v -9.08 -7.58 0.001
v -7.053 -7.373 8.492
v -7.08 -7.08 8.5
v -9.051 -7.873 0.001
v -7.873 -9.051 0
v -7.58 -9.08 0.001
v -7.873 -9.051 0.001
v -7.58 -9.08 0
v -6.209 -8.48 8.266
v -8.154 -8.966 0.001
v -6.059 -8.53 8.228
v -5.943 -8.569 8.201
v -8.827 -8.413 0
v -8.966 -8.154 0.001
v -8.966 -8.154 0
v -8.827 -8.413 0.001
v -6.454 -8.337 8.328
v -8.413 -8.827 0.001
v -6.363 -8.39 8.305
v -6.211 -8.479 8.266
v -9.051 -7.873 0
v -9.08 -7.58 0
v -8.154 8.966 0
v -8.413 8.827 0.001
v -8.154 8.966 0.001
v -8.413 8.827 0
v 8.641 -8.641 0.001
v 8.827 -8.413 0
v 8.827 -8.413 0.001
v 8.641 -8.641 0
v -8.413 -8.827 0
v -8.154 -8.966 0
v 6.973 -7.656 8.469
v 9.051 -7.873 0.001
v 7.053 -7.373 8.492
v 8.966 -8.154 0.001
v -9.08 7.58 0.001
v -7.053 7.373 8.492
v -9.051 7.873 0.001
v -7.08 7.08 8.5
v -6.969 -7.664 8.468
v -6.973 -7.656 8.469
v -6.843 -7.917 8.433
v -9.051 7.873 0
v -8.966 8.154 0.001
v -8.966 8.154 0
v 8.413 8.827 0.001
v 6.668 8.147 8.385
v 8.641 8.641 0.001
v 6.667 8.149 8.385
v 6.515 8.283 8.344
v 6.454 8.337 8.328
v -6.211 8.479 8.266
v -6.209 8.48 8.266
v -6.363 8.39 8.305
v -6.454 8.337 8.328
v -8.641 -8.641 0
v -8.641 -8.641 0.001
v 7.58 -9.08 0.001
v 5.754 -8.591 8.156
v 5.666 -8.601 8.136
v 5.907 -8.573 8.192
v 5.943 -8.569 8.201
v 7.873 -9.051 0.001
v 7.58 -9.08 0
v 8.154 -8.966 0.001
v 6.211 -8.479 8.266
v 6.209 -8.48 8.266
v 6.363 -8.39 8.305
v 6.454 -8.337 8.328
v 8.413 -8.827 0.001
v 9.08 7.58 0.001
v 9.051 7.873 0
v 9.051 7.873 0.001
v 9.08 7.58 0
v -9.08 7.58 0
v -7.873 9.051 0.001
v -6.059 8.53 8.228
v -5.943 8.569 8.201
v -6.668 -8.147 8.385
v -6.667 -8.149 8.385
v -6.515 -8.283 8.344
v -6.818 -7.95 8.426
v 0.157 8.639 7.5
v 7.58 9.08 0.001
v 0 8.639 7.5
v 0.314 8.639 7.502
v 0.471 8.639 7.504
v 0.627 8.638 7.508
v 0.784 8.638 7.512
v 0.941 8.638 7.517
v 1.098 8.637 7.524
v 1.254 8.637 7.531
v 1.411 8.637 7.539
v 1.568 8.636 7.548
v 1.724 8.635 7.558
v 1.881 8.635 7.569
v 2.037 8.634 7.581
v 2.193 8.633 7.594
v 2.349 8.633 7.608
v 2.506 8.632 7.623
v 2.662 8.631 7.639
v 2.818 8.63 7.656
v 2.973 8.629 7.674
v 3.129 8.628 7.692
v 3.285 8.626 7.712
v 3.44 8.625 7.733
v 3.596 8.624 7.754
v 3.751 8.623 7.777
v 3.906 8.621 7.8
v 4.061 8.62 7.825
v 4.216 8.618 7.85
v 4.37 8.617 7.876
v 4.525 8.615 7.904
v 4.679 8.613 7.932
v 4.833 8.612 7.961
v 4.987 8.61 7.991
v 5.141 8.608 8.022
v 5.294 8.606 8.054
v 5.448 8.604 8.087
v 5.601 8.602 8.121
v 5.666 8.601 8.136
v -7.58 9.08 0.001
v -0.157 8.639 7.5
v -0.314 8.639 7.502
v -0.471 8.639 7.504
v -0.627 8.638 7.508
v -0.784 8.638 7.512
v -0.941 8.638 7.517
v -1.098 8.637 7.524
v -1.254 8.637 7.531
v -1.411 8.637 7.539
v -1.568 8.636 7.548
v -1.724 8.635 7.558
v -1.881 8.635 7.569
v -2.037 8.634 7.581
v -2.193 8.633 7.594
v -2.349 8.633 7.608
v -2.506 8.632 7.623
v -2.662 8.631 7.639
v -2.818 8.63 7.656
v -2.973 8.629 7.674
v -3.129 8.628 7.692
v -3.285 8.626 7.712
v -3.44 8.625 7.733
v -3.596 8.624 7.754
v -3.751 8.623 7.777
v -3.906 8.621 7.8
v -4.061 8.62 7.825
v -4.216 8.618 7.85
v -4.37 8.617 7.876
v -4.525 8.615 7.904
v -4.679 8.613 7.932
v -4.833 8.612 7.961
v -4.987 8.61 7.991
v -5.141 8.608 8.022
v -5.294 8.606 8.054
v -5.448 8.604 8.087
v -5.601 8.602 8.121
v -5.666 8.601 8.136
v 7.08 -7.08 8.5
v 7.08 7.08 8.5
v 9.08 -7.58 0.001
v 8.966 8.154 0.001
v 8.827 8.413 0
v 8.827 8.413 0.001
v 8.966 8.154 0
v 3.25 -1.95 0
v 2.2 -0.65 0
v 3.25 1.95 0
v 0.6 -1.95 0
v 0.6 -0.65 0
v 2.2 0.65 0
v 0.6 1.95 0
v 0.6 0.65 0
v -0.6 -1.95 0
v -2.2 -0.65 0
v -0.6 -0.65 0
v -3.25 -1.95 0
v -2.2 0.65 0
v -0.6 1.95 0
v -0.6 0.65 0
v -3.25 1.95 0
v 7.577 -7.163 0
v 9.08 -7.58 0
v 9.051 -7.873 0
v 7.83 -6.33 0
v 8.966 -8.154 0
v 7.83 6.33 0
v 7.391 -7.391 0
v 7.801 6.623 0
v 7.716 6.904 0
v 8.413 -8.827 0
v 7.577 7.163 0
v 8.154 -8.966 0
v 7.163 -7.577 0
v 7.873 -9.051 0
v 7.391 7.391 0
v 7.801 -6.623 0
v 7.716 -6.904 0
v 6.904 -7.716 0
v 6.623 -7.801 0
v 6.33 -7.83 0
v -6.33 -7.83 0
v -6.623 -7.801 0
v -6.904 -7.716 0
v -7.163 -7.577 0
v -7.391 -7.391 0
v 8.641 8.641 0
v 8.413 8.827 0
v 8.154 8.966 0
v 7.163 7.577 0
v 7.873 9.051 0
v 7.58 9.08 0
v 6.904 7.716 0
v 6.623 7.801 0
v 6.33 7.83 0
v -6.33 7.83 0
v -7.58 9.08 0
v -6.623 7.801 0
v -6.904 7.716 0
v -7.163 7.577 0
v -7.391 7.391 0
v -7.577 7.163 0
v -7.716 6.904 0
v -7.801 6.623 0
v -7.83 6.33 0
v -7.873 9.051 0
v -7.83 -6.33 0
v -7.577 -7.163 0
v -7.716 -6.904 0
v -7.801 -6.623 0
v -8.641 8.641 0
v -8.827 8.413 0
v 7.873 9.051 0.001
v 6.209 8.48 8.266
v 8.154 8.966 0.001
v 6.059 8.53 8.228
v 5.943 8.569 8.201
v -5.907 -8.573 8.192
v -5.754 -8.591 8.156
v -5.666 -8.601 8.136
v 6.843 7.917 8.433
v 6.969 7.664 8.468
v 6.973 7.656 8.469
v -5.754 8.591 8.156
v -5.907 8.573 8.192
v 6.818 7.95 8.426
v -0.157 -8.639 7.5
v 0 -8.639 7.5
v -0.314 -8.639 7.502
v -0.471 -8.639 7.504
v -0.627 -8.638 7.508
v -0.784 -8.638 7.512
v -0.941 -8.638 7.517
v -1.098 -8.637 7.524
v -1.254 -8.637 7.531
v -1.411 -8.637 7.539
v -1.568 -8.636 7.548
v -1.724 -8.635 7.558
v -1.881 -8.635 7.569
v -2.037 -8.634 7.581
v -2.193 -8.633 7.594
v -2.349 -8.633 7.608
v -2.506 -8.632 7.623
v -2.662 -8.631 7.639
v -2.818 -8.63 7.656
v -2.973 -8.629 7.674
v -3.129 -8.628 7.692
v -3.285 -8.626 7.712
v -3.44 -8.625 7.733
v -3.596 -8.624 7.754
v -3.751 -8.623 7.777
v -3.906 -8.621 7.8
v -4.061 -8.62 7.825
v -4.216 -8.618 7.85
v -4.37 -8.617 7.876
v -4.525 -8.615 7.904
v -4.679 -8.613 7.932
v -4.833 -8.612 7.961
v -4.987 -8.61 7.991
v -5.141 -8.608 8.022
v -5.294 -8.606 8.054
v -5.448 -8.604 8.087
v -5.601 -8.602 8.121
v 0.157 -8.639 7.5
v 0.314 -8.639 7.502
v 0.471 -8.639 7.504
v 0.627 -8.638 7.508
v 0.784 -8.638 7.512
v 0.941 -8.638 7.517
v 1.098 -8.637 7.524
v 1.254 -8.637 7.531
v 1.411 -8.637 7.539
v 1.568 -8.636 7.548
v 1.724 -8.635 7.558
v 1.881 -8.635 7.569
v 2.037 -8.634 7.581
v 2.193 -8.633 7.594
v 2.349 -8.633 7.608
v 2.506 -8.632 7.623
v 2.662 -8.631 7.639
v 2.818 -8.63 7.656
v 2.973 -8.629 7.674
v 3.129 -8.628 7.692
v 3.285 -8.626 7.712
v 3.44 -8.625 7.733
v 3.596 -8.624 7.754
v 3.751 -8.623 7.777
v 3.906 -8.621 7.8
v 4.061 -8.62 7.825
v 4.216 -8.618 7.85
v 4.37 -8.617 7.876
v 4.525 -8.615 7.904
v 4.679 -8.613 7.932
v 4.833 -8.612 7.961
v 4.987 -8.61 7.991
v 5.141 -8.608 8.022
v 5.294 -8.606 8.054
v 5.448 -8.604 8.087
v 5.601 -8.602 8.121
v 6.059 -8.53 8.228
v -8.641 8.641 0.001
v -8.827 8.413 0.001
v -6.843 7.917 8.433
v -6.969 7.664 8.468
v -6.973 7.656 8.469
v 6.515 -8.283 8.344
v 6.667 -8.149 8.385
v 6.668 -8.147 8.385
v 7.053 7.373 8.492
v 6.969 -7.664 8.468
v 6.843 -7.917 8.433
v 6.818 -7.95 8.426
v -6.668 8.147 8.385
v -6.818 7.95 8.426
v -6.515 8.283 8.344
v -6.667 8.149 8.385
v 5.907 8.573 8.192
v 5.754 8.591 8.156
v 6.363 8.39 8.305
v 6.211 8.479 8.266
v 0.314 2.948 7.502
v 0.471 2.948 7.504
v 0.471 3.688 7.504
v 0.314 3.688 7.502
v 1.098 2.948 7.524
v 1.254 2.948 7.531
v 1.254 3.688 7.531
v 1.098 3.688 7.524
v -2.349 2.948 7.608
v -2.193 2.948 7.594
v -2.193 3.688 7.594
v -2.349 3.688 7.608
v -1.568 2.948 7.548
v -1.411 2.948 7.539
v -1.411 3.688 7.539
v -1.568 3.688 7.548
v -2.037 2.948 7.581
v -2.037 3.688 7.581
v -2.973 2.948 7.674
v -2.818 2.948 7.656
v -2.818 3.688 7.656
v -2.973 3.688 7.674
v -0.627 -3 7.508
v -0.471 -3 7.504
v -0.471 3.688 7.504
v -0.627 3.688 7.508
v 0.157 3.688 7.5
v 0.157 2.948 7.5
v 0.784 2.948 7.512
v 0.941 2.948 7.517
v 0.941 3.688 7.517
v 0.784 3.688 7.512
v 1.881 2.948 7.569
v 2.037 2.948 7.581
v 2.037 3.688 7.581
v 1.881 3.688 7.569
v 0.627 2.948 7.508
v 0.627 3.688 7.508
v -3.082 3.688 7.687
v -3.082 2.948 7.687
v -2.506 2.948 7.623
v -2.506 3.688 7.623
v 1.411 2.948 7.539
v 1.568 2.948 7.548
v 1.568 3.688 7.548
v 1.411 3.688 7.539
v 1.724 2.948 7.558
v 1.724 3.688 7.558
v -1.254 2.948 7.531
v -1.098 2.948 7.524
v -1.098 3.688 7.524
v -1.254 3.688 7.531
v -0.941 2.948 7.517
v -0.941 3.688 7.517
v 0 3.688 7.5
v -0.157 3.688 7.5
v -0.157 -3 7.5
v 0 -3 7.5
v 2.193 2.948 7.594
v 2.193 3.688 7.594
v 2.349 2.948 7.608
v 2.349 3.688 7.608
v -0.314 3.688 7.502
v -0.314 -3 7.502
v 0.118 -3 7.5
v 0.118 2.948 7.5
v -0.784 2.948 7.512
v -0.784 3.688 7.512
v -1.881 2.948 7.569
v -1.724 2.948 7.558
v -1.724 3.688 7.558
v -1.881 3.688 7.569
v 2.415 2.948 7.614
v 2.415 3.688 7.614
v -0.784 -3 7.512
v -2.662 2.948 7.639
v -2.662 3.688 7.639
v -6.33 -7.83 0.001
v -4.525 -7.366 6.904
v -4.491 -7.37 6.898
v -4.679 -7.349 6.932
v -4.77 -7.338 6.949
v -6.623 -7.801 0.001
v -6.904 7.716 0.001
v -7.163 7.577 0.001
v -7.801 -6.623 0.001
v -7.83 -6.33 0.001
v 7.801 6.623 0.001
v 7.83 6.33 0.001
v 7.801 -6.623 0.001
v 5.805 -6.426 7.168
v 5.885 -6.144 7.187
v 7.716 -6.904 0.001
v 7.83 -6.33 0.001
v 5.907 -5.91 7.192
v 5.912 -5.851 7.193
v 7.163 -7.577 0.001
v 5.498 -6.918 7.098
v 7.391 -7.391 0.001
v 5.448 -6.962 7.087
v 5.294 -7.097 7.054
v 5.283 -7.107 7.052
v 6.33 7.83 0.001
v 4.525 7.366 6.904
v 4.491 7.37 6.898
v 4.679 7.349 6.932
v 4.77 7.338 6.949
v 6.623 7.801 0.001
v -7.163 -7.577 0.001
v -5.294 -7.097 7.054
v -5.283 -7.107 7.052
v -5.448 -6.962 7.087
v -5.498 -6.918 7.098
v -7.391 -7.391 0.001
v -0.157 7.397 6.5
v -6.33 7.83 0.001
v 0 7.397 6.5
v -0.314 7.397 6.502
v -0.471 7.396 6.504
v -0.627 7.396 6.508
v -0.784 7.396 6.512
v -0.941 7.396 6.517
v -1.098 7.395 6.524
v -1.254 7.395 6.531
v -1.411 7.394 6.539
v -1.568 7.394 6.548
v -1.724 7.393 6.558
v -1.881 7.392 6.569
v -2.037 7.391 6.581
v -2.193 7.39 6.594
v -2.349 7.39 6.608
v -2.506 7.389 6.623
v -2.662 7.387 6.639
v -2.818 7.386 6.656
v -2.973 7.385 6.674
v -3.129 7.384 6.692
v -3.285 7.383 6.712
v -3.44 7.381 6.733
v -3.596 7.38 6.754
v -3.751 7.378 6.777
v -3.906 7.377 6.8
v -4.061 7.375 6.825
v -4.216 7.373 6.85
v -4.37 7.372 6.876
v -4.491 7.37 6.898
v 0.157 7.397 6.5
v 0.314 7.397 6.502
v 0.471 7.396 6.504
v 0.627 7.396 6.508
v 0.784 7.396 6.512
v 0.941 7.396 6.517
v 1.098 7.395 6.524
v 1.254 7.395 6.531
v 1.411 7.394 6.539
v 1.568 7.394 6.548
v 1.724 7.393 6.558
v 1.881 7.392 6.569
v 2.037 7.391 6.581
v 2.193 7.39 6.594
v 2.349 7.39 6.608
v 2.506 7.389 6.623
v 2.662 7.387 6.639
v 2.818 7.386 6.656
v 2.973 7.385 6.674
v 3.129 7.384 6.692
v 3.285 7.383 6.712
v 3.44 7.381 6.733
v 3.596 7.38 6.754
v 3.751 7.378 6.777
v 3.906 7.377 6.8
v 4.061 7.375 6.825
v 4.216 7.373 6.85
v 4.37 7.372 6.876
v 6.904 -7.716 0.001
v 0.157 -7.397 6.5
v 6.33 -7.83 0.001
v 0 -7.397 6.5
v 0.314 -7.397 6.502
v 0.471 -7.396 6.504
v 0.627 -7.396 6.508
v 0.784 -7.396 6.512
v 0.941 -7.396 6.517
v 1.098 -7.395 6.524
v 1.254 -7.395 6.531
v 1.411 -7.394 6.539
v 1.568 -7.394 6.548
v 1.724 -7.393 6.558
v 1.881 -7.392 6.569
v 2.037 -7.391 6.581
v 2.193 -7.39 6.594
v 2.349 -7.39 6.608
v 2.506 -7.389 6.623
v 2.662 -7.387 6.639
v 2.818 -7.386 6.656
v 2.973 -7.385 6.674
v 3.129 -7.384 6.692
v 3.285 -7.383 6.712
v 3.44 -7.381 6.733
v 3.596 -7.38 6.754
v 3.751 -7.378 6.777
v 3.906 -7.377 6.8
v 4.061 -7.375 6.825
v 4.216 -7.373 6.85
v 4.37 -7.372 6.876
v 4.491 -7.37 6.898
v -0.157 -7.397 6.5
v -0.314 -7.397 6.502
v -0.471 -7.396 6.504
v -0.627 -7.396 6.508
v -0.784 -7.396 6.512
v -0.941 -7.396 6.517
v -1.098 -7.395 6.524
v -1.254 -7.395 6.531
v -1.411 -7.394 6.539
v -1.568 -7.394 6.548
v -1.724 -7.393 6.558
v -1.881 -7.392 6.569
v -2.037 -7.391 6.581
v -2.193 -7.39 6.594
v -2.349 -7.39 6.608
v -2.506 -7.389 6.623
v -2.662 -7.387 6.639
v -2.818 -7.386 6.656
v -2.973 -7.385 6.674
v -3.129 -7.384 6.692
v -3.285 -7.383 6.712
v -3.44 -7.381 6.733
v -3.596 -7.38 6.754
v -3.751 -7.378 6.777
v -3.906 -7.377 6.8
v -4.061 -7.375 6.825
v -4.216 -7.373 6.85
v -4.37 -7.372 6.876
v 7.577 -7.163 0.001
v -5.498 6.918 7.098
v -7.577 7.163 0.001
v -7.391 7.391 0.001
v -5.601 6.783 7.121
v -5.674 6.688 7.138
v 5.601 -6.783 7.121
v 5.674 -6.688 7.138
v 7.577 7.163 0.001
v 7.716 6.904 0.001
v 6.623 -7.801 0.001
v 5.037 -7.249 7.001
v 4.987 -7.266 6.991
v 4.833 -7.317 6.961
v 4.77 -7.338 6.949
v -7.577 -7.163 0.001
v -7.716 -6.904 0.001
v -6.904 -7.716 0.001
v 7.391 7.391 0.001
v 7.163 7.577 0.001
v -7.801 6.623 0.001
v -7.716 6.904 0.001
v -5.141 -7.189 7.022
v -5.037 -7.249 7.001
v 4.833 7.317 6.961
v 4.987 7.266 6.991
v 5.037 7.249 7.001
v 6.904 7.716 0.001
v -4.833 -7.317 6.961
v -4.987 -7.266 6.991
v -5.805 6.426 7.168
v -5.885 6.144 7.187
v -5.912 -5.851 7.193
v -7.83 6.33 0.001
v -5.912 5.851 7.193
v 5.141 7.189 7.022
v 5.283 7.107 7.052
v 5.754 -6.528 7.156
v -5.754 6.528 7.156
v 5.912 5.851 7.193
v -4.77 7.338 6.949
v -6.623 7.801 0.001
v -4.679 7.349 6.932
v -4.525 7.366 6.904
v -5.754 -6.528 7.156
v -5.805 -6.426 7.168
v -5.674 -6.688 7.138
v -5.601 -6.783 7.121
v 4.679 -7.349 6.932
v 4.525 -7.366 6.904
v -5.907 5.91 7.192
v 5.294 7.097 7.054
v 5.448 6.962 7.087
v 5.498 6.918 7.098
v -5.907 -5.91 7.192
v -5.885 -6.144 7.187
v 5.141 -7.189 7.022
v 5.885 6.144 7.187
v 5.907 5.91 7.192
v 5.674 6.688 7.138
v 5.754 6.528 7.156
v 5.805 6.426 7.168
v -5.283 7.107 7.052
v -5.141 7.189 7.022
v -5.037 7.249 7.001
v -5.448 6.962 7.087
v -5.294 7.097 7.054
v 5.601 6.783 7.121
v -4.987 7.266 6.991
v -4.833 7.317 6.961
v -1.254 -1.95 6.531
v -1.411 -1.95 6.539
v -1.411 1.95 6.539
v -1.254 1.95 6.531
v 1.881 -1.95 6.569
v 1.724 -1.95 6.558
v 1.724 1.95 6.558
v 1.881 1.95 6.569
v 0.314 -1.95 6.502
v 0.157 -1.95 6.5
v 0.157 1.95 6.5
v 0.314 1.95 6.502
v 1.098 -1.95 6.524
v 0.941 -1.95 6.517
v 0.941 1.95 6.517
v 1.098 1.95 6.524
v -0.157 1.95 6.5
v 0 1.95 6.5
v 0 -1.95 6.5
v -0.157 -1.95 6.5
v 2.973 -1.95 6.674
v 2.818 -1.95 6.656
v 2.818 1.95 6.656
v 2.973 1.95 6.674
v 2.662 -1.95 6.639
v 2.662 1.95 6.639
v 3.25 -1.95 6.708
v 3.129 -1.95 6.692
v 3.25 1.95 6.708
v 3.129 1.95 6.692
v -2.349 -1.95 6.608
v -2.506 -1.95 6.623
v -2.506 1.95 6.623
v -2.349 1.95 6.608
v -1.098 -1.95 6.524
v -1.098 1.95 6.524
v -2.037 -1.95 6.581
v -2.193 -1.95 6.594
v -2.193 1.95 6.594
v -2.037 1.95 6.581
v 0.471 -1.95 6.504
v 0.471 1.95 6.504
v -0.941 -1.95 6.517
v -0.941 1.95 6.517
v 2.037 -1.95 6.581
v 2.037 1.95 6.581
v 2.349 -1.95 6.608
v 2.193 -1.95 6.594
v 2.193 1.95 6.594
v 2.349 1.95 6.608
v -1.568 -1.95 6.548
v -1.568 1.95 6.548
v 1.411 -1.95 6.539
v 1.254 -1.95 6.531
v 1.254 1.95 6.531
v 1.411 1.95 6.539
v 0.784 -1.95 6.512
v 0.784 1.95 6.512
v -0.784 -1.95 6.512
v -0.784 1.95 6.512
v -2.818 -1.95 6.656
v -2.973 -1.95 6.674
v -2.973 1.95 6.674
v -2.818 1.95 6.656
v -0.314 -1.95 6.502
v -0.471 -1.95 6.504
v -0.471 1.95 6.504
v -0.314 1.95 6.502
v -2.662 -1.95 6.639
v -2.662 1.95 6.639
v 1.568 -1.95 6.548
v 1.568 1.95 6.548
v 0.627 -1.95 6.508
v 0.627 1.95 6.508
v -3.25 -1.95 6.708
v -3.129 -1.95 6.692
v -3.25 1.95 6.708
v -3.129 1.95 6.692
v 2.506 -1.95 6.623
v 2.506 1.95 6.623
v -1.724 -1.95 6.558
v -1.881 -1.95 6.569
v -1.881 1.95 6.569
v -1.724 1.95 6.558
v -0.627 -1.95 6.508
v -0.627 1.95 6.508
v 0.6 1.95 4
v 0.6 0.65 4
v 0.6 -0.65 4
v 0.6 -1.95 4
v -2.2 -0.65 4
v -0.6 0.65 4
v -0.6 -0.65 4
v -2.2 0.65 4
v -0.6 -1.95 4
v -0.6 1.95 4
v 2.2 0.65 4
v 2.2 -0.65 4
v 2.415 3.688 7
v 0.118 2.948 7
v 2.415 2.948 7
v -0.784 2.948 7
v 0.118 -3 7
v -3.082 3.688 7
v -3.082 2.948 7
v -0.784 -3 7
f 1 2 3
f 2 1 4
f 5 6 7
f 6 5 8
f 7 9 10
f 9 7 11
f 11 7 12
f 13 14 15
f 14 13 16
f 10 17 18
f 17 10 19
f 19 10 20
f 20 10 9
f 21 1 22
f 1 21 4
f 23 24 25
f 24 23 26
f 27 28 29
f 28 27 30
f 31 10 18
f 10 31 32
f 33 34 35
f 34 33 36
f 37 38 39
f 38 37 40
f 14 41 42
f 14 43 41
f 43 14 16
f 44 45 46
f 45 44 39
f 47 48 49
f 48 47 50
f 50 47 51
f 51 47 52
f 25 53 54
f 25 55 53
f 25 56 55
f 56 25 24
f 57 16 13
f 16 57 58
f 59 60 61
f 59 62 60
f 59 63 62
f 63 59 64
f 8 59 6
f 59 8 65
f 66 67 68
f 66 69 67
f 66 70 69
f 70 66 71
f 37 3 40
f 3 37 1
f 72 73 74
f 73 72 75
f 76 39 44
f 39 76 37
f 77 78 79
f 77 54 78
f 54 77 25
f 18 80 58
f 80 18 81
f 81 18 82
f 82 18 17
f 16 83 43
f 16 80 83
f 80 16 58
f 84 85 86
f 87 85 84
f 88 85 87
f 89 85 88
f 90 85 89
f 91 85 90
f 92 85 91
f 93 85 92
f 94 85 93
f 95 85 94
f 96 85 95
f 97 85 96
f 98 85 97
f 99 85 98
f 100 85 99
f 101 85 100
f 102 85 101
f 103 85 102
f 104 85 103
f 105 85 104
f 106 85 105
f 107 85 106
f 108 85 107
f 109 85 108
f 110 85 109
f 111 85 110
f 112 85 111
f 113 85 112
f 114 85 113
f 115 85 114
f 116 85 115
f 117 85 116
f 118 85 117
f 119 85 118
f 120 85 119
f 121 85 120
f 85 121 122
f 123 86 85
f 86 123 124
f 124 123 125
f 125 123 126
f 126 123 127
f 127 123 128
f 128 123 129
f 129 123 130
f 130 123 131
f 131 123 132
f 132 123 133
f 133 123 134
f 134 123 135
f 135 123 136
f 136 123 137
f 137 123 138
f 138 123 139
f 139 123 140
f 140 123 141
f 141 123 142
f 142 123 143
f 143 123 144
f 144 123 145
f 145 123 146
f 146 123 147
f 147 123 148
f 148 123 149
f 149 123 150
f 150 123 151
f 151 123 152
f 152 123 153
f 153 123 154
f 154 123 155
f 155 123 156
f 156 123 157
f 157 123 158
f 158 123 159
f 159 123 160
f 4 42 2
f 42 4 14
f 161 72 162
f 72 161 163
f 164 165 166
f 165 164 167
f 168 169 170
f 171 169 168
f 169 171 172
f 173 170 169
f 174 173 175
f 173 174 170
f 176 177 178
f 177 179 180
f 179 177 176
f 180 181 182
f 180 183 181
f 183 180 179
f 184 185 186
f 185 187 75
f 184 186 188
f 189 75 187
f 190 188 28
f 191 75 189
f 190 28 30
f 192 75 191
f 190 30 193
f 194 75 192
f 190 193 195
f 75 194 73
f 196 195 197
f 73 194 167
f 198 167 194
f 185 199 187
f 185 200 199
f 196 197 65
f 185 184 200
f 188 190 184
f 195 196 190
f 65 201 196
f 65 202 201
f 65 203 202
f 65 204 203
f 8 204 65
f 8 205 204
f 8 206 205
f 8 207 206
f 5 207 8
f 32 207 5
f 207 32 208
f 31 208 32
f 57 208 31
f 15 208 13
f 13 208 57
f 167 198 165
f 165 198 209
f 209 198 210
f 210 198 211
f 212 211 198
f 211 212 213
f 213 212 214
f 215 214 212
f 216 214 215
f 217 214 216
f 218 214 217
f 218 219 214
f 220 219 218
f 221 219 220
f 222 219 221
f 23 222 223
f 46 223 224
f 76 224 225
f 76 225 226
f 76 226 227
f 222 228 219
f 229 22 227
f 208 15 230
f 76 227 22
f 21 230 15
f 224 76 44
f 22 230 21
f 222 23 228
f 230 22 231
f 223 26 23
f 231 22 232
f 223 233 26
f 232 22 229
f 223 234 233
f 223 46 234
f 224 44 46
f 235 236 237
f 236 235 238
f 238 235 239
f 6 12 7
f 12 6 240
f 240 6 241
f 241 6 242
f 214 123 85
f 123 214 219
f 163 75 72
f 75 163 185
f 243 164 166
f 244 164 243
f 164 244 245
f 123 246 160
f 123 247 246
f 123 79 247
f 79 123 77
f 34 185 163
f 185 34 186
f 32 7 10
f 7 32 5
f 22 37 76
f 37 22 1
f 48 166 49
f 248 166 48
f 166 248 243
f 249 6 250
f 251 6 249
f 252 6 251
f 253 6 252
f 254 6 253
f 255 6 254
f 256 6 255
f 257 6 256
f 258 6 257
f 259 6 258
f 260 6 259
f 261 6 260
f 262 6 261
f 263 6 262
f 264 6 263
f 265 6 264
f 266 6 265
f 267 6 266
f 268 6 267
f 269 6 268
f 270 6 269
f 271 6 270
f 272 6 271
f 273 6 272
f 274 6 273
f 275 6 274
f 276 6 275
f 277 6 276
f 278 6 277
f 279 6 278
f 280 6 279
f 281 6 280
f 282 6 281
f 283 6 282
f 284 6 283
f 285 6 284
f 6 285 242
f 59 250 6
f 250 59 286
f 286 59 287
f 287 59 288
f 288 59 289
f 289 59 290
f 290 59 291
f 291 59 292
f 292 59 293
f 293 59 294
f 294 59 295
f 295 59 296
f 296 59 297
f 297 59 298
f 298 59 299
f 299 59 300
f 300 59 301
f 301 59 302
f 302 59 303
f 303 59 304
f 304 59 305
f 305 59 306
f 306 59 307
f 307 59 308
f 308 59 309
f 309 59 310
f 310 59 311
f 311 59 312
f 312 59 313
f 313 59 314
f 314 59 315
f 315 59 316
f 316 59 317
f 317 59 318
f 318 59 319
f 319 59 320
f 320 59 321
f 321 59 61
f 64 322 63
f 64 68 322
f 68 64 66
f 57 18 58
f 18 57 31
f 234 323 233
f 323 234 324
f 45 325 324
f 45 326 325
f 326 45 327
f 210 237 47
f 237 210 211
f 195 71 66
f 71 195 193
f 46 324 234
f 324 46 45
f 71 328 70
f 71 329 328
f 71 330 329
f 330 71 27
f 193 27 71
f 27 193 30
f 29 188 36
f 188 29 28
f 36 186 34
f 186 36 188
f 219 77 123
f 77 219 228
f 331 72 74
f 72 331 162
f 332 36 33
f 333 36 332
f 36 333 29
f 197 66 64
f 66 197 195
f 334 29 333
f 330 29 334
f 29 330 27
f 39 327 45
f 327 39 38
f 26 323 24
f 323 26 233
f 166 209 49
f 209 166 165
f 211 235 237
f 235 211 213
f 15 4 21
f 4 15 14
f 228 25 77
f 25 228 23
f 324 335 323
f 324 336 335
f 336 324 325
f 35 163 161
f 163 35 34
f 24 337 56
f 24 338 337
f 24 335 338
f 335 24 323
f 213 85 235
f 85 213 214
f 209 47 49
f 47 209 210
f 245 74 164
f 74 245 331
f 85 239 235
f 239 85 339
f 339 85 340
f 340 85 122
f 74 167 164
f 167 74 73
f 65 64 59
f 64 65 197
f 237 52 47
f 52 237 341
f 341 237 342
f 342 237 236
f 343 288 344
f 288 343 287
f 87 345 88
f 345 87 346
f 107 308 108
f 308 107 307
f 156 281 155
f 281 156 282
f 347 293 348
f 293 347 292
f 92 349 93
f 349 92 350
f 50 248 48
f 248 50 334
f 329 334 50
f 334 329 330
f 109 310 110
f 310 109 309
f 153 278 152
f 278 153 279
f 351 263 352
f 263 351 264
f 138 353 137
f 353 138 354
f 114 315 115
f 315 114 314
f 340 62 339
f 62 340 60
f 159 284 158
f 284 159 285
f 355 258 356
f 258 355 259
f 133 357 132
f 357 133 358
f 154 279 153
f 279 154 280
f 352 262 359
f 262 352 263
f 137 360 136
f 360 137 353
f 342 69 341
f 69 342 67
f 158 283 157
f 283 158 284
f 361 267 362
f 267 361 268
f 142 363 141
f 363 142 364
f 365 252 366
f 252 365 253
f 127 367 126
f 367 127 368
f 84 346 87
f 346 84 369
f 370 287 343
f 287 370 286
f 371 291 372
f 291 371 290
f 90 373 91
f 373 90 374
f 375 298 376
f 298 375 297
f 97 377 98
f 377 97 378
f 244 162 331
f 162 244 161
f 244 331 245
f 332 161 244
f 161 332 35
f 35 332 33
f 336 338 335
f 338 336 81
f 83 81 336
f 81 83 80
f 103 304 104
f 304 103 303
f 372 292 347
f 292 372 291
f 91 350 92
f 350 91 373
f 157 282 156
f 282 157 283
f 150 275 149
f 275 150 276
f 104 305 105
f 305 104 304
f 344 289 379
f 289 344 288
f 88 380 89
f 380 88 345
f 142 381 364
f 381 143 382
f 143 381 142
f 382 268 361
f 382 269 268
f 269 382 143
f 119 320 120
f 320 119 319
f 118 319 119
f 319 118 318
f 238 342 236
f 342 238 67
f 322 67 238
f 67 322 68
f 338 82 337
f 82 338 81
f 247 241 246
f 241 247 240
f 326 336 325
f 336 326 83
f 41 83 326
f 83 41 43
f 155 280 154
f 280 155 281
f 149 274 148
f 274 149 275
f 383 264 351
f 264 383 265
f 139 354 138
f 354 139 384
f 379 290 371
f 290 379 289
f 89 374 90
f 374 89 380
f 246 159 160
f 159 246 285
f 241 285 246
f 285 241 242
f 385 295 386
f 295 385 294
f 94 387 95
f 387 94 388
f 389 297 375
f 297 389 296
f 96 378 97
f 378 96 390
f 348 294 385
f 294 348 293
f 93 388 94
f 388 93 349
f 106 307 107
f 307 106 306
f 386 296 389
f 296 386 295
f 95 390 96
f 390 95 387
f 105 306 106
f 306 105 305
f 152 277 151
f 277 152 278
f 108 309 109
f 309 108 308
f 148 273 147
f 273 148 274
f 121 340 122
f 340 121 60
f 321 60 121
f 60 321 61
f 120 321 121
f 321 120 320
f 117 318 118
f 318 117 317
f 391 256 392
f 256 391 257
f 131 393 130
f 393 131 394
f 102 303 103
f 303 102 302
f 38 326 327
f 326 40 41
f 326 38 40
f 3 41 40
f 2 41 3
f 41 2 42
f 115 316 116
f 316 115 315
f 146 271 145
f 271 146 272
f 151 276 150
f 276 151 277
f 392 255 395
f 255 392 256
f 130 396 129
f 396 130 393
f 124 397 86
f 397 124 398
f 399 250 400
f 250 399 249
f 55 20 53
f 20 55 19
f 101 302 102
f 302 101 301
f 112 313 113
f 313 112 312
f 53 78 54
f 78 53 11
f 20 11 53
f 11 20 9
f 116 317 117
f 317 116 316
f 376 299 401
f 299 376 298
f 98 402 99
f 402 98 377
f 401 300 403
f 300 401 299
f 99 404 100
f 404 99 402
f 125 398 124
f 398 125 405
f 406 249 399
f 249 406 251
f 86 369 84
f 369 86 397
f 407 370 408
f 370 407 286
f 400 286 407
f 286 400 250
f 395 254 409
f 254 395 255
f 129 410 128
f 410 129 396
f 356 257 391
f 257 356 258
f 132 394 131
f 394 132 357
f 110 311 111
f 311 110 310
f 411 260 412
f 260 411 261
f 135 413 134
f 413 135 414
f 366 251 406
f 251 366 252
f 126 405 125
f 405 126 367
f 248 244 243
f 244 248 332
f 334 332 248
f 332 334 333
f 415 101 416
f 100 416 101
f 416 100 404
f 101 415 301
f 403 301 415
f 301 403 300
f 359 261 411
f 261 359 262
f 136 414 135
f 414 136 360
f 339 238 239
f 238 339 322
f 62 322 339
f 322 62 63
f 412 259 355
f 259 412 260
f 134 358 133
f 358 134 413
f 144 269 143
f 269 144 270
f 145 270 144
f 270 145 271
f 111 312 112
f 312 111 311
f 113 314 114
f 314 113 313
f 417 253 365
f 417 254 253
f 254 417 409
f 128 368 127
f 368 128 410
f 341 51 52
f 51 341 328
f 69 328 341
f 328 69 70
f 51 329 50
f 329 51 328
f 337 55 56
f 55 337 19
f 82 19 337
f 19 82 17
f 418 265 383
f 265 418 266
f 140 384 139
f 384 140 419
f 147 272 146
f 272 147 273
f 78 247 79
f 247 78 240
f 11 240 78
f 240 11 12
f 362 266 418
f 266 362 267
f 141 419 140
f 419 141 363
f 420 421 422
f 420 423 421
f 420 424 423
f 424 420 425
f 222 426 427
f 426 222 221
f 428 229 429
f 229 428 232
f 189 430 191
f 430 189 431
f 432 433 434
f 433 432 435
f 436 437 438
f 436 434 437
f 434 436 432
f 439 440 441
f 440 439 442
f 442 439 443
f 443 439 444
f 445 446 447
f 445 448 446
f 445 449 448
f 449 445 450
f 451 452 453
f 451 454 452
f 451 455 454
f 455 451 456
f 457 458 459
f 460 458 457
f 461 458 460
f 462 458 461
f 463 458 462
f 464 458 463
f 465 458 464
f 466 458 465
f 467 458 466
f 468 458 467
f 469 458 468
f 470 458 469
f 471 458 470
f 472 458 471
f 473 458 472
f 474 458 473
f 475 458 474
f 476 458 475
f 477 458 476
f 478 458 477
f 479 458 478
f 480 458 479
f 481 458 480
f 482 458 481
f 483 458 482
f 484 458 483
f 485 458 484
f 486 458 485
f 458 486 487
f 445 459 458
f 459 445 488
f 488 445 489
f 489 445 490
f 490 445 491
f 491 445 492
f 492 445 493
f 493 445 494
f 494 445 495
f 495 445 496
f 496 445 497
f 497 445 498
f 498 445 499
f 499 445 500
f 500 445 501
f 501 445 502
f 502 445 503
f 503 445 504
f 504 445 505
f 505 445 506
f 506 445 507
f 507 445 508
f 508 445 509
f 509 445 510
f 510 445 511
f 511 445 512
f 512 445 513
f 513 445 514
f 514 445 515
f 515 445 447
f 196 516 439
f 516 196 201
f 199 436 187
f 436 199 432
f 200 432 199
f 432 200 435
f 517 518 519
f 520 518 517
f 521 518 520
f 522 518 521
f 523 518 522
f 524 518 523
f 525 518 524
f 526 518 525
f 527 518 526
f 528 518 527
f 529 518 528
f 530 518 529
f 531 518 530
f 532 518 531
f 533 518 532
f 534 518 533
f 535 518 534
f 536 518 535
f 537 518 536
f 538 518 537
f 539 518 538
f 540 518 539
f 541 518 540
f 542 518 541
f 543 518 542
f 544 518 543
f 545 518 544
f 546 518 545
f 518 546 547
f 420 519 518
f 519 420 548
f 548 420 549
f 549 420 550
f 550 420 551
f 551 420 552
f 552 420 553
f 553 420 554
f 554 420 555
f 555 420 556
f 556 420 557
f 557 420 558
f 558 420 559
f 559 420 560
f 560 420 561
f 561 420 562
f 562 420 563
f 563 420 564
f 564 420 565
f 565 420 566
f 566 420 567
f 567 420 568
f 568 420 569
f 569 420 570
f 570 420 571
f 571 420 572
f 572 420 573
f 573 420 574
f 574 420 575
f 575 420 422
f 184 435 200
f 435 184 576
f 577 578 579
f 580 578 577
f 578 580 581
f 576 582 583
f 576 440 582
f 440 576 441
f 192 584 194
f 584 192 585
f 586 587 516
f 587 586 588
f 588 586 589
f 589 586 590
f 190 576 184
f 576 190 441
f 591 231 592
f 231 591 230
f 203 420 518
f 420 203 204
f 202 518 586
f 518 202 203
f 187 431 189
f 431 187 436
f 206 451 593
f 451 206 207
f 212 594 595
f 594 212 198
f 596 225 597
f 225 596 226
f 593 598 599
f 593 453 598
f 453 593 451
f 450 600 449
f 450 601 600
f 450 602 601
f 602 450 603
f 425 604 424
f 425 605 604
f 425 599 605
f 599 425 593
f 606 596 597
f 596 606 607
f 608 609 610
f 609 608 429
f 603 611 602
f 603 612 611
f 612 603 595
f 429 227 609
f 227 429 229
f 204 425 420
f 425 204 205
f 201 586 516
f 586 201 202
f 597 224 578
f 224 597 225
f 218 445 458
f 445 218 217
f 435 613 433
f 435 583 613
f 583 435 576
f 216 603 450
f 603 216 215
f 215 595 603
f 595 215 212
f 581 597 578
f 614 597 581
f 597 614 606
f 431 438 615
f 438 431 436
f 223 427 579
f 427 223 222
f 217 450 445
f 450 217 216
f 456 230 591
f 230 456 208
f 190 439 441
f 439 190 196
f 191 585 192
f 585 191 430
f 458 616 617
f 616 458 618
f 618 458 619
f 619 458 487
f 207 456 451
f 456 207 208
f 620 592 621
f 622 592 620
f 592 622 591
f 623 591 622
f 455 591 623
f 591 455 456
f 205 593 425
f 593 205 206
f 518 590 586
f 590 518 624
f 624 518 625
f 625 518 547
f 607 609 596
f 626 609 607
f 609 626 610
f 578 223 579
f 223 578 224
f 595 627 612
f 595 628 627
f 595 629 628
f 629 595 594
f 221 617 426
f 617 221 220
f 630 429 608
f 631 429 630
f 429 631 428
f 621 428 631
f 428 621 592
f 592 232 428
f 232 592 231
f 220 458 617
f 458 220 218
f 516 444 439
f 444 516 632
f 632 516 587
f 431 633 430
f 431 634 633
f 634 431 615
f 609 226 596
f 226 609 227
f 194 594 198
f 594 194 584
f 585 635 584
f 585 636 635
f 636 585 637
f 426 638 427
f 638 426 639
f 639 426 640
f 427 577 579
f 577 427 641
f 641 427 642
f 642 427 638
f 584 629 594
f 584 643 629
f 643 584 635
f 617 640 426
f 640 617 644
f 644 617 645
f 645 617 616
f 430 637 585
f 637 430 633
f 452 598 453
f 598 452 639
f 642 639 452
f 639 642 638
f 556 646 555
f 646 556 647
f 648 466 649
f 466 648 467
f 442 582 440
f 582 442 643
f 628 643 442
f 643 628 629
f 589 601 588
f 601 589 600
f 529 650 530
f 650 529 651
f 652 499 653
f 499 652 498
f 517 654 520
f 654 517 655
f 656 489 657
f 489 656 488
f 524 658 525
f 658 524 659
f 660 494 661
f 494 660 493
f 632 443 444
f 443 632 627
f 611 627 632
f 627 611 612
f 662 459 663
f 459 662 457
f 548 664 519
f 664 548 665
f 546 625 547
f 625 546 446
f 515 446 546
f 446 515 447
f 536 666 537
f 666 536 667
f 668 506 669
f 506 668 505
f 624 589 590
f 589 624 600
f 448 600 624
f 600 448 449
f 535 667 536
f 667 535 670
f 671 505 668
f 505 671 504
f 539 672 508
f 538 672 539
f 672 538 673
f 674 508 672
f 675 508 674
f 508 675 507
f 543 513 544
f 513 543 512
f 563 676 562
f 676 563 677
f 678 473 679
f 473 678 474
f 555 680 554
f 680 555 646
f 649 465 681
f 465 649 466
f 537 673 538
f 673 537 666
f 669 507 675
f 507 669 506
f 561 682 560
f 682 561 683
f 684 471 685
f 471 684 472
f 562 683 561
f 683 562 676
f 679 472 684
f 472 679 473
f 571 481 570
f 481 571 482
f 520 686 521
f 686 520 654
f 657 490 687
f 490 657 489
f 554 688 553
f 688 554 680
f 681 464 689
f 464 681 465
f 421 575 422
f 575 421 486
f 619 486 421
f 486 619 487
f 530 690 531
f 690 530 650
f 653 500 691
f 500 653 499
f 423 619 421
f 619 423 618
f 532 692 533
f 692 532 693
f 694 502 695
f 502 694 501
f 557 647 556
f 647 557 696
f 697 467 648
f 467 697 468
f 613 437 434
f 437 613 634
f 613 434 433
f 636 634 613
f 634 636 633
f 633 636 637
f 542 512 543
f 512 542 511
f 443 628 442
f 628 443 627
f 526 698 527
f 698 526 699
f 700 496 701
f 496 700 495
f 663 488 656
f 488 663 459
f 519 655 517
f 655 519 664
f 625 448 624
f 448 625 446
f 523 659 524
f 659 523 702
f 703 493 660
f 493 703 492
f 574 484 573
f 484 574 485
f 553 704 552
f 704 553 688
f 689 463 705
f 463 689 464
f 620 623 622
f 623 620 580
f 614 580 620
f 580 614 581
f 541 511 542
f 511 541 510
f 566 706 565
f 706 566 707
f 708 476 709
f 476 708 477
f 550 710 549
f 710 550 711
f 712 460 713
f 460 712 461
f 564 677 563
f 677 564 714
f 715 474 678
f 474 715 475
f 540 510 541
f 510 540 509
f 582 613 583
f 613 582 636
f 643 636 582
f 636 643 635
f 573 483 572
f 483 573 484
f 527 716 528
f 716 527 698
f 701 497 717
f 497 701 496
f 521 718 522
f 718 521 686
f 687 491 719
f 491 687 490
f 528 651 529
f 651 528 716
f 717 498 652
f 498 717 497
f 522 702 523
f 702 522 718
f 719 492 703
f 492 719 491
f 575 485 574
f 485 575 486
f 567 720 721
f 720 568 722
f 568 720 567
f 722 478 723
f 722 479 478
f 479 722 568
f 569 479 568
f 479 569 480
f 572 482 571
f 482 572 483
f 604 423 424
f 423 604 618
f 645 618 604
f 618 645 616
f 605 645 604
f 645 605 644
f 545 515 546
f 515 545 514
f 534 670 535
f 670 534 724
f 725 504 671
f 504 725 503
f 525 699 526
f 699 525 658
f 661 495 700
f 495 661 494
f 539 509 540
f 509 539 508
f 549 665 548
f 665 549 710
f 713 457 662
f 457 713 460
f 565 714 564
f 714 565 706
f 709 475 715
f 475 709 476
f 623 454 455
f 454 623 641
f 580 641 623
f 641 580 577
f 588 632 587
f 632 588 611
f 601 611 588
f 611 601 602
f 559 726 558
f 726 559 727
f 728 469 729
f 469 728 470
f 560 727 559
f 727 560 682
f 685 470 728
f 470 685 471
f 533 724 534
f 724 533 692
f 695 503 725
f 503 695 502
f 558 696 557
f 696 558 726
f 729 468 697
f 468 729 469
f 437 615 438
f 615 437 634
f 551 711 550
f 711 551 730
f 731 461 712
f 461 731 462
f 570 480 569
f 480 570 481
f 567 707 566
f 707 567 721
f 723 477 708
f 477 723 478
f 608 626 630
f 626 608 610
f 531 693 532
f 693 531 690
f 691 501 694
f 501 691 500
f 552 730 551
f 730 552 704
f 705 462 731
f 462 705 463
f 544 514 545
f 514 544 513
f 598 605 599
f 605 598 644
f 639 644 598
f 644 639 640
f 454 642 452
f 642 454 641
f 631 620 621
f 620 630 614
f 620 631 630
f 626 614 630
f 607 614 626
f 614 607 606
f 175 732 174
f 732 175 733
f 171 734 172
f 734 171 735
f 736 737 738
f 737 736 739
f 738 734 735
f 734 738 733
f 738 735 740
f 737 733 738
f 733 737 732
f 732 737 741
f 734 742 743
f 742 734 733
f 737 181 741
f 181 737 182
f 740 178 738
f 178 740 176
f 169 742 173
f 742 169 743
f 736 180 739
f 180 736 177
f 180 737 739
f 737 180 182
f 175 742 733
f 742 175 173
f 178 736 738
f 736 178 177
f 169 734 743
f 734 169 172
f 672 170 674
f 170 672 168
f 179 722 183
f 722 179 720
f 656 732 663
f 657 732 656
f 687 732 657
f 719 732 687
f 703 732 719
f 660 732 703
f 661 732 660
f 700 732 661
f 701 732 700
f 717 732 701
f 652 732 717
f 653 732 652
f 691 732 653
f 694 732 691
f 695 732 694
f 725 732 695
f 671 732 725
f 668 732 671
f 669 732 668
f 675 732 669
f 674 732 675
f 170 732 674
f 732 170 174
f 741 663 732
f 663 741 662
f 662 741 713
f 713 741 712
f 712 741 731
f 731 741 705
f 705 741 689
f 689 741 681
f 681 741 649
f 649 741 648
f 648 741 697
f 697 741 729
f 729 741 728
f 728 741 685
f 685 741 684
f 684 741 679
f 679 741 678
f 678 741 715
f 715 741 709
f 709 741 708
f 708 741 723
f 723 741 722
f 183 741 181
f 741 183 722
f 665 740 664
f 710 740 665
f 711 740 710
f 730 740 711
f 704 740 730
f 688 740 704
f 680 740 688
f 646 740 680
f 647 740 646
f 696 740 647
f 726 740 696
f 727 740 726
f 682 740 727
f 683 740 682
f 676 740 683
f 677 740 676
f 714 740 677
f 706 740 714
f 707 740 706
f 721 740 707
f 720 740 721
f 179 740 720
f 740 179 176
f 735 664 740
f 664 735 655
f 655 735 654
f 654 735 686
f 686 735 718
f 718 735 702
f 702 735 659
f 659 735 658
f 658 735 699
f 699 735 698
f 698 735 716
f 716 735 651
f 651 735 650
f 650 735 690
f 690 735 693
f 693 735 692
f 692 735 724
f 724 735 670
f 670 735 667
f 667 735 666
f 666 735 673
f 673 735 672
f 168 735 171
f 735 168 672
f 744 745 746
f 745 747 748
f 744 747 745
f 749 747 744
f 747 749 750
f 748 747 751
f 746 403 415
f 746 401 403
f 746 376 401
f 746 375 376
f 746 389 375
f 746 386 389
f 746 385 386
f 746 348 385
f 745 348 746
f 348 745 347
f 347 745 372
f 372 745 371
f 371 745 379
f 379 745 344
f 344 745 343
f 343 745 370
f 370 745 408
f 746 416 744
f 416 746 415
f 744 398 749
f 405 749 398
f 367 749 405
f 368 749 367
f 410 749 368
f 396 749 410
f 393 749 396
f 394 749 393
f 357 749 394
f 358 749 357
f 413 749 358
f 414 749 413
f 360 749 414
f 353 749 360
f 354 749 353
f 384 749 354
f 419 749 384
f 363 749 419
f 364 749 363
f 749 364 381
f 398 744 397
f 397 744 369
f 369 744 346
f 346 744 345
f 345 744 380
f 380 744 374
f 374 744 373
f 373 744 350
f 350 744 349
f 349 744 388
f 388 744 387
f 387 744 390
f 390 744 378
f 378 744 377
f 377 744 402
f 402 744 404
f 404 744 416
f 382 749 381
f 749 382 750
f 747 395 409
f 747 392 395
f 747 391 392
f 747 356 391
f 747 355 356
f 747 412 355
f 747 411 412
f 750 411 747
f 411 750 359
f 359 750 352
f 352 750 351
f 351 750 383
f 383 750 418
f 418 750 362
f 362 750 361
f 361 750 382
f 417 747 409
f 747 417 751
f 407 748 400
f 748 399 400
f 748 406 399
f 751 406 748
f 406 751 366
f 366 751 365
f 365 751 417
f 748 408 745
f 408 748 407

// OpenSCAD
/* [Key] */

//length in units of key
key_length = 1;
//height in units of key. should remain 1 for most uses
key_height = 1;
//keycap type, 0: S-, T-, K-..., 1: AOEU*FR -TSDZ
key_profile_index = 0;

// keytop thickness, aka how many millimeters between the inside and outside of the top surface of the key
keytop_thickness = 1;

// wall thickness, aka the thickness of the sides of the keycap. note this is the total thickness, aka 3 = 1.5mm walls
wall_thickness = 2.5;

/* [Brim] */
//enable brim for connector
has_brim = 0;
//brim radius. 11 ensconces normal keycap stem in normal keycap
brim_radius = 11;
//brim depth
brim_depth = .3;

/* [Stabilizers] */
//whether stabilizer connectors are enabled
stabilizers = 0;
//stabilizer distance in mm
stabilizer_distance = 50;

/* [Dish] */
// invert dishing. mostly for spacebar
inverted_dish = 0;

/* [Stem] */
// cherry MX or Alps stem, or totally broken circular cherry stem [0..2]
stem_profile = 0;
// how inset the stem is from the bottom of the key. experimental. requires support
stem_inset = 0;
// stem offset in units NOT MM. for stepped caps lock
stem_offset = 0;

/* [Hidden] */
//change to round things better
$fn = 32;
//beginning to use unit instead of baked in 19.05
unit = 19.05;

//minkowski radius. radius of sphere used in minkowski sum for minkowski_key function. 1.75 default for faux G20
minkowski_radius = 1.75;

//profile specific stuff

/*
 Here we have, for lack of a better implementation, an array
 that defines the more intimate aspects of a key.
 order is thus:
 1. Bottom Key Width: width of the immediate bottom of the key
 2. Bottom Key Height: height of the immediate bottom of the key
 3. Top Key Width Difference: mm to subtract from bottom key width to create top key width
 4. Top Key Height Difference: mm to subtract from bottom key height to create top key height
 5. total Depth: how tall the total in the switch is before dishing
 6. Top Tilt: X rotation of the top. Top and dish obj are rotated
 7. Top Skew: Y skew of the top of the key relative to the bottom. DCS has some, DSA has none (its centered)
 8. Dish Type: type of dishing. check out dish function for the options
 9. Dish Depth: how many mm to cut into the key with
 10. Dish Radius: radius of dish obj, the Sphere or Cylinder that cuts into the keycap
*/

key_profiles = [
    // Steno specific
	[ // Flat Column (S-, T-)
		18.16,  // Bottom Key Width
		18.16,  // Bottom Key Height
		4,   // Top Key Width Difference
		1,   // Top Key Height Difference
		8.5, // total Depth
		0,  // Top Tilt
		0,// Top Skew

		//Dish Profile

		0,   // Dish Type
		1,   // Dish Depth
		0,   // Dish Skew X
		0,   // DIsh Skew Y
        0,   // Stem rotation
	],
	[ // Side-tilt (-T, -S)
		18.16,  // Bottom Key Width
		18.16,  // Bottom Key Height
		1,   // Top Key Width Difference
		4,   // Top Key Height Difference
		7.5, // total Depth
		9,  // Top Tilt
		1.75,// Top Skew

		//Dish Profile

		2,   // Dish Type
		1,   // Dish Depth
		0,   // Dish Skew X
		0,   // Dish Skew Y
        90,  // Stem rotation
	],
    [ // Vowels!
        18.16,  // Bottom Key Width
		18.16,  // Bottom Key Height
		1,   // Top Key Width Difference
		1,   // Top Key Height Difference
		8.5, // total Depth
		3,  // Top Tilt
		5.5, // Top Skew

		//Dish Profile

		0,   // Dish Type
		1,   // Dish Depth
		0,   // Dish Skew X
		0,   // DIsh Skew Y
        0,   // Stem rotation
    ],
];

// derived variables
//key profile selected
key_profile = key_profiles[key_profile_index];

// names, so I don't go crazy
bottom_key_width = key_profile[0];
bottom_key_height = key_profile[1];
width_difference = key_profile[2];
height_difference = key_profile[3];
total_depth = key_profile[4];
top_tilt = key_profile[5] / key_height;
top_skew = key_profile[6];
dish_type = key_profile[7];
dish_depth = key_profile[8];
dish_skew_x = key_profile[9];
dish_skew_y = key_profile[10];
stem_rotation = key_profile[11];

// actual mm key width and height
total_key_width = bottom_key_width + (unit * (key_length - 1));
total_key_height = bottom_key_height + (unit * (key_height - 1));

// actual mm key width and height at the top
top_total_key_width = bottom_key_width + (unit * (key_length - 1)) - width_difference;
top_total_key_height = bottom_key_height + (unit * (key_height - 1)) - height_difference;

//centered
module roundedRect(size, radius) {
	x = size[0];
	y = size[1];
	z = size[2];

	translate([-x/2,-y/2,0])
	linear_extrude(height=z)
	hull() {
		translate([radius, radius, 0])
		circle(r=radius);

		translate([x - radius, radius, 0])
		circle(r=radius);

		translate([x - radius, y - radius, 0])
		circle(r=radius);

		translate([radius, y - radius, 0])
		circle(r=radius);
	}
}

// stem related stuff

// bottom we can use to anchor the stem, just a big ol cube with the inside of
// the keycap hollowed out
module inside(){
	difference(){
		translate([0,0,50]) cube([100000,100000,100000],center=true);
		// NOTE: you're saying hey, if this is the inside why aren't we doing
		// wall_thickness, keytop_thickness? well first off congratulations for
		// figuring that out cuz it's a rat's nest in here. second off
		// due to how the minkowski_key function works that isn't working out right
		// now. it's a simple change if is_minkowski is implemented though
		shape(0, 0);
	}
}

module cherry_stem(){
	// cross length
	cross_length = 4.4;
  //extra vertical cross length - the extra length of the up/down bar of the cross
  extra_vertical_cross_length = 1.1;
	//dimensions of connector
	// outer cross extra length in x
	extra_outer_cross_width = 2.10;
	// outer cross extra length in y
	extra_outer_cross_height = -0.5; // Compensate to stop edge rubbing.
	// dimensions of cross
	// horizontal cross bar width
	horizontal_cross_width = 1.3; // 1.4
	// vertical cross bar width
	vertical_cross_width = 1.2; // 1.3
	// cross depth, stem height is 3.4mm
	cross_depth = 4;

	difference(){
		union(){
            if (stem_profile != 2){
                translate([
                    -(cross_length+extra_outer_cross_width)/2,
                    -(cross_length+extra_outer_cross_height)/2,
                    stem_inset
                ])
    			cube([ // the base of the stem, the part the cruciform digs into
					cross_length+extra_outer_cross_width,
					cross_length+extra_outer_cross_height,
					50
    			]);
            } else {
                cylinder(
                    d = cross_length+extra_outer_cross_height,
                    h = 50
                );
            }
			if (has_brim == 1){ cylinder(r=brim_radius,h=brim_depth); }
		}
		//the cross part of the steam
		translate([0,0,(cross_depth)/2 + stem_inset]){
	        cube([vertical_cross_width,cross_length+extra_vertical_cross_length,cross_depth], center=true );
	        cube([cross_length,horizontal_cross_width,cross_depth], center=true );
	    }
	}
}

module alps_stem(){
	cross_depth = 40;
	width = 4.45;
	height = 2.25;

	base_width = 12;
	base_height = 15;

	translate([0,0,cross_depth/2 + stem_inset]){
		cube([width,height,cross_depth], center = true);
	}
}

//whole connector, alps or cherry, trimmed to fit
module connector(has_brim){
	difference(){
		//TODO can I really not do an array index here?
		translate([-unit * stem_offset, 0, 0])
        rotate(stem_rotation, 0, 0) {
            union(){
                if(stem_profile == 0 || stem_profile == 2) cherry_stem();
                if(stem_profile == 1) alps_stem();
            }
        }
		inside();
	}
}

//stabilizer connectors
module stabilizer_connectors(has_brim){
	translate([stabilizer_distance,0,0]) connector(has_brim);
	translate([-stabilizer_distance,0,0]) connector(has_brim);
}



//shape related stuff




//general shape of key. used for inside and outside
module shape(thickness_difference, depth_difference){
  if (inverted_dish == 1){
		difference(){
			union(){
				shape_hull(thickness_difference, depth_difference, 1);
				dish(depth_difference);
			}
			outside(thickness_difference);
		}
	} else{
		difference(){
			shape_hull(thickness_difference, depth_difference, 1);
			dish(depth_difference);
		}
	}
}

// conicalish clipping shape to trim things off the outside of the keycap
// literally just a key with height of 2 to make sure nothing goes awry with dishing etc
module outside(thickness_difference){
	difference(){
		cube([100000,100000,100000],center = true);
		shape_hull(thickness_difference, 0, 2);
	}
}

// super basic hull shape without dish
// modifier multiplies the height and top differences of the shape,
// which is only used for dishing to cut the dish off correctly
// height_difference used for keytop thickness
module shape_hull(thickness_difference, depth_difference, modifier){
	hull(){
		// bottom_key_width + (key_length -1) * unit is the correct length of the
		// key. only 1u of the key should be bottom_key_width long; all others
		// should be 1u
		roundedRect([total_key_width - thickness_difference, total_key_height - thickness_difference, .001],1.5);

		//height_difference outside of modifier because that doesnt make sense
		translate([0,top_skew,total_depth * modifier - depth_difference])
		rotate([-top_tilt,0,0])
		roundedRect([total_key_width - thickness_difference - width_difference * modifier, total_key_height - thickness_difference - height_difference * modifier, .001],1.5);
	}
}



//dish related stuff



//dish selector
module dish(depth_difference){
	if(dish_type == 0){ // cylindrical dish
		cylindrical_dish(depth_difference);
	}
	else if (dish_type == 1) { // spherical dish
		spherical_dish(depth_difference);
	}
	else if (dish_type == 2){ // SIDEWAYS cylindrical dish - used for spacebar
		sideways_cylindrical_dish(depth_difference);
	}
  else if (dish_type == 3){
  	// no dish
  }
}

module cylindrical_dish(depth_difference){
	/* we do some funky math here
	 * basically you want to have the dish "dig in" to the keycap x millimeters
	 * in order to do that you have to solve a small (2d) system of equations
	 * where the chord of the spherical cross section of the dish is
	 * the width of the keycap.
	 */
	// the distance you have to move the dish up so it digs in dish_depth millimeters
	chord_length = (pow(top_total_key_width, 2) - 4 * pow(dish_depth, 2)) / (8 * dish_depth);
	//the radius of the dish
	rad = (pow(top_total_key_width, 2) + 4 * pow(dish_depth, 2)) / (8 * dish_depth);

	if (inverted_dish == 1){
		translate([dish_skew_x, top_skew + dish_skew_y, total_depth - depth_difference])
		rotate([90-top_tilt,0,0])
		translate([0,-chord_length,0])
		cylinder(h=100,r=rad, $fn=1024, center=true);
	}
	else{
		translate([dish_skew_x, top_skew + dish_skew_y, total_depth - depth_difference])
		rotate([90-top_tilt,0,0])
		translate([0,chord_length,0])
		cylinder(h=100,r=rad, $fn=1024, center=true);
	}

}

module spherical_dish(depth_difference){
	//same thing as the cylindrical dish here, but we need the corners to just touch - so we have to find the hypotenuse of the top
	chord = pow((pow(top_total_key_width,2) + pow(top_total_key_height, 2)),0.5); //getting diagonal of the top

	// the distance you have to move the dish up so it digs in dish_depth millimeters
	chord_length = (pow(chord, 2) - 4 * pow(dish_depth, 2)) / (8 * dish_depth);
	//the radius of the dish
	rad = (pow(chord, 2) + 4 * pow(dish_depth, 2)) / (8 * dish_depth);

	if (inverted_dish == 1){
		translate([dish_skew_x, top_skew + dish_skew_y, total_depth - depth_difference])
		rotate([-top_tilt,0,0])
		translate([0,0,-chord_length])
		//NOTE: if your dish is long at all you might need to increase this number
		sphere(r=rad, $fn=512);
	}
	else{
		translate([dish_skew_x, top_skew + dish_skew_y, total_depth - depth_difference])
		rotate([-top_tilt,0,0])
		translate([0,0,chord_length])
		sphere(r=rad, $fn=256);
	}
}

module sideways_cylindrical_dish(depth_difference){
	chord_length = (pow(top_total_key_height, 2) - 4 * pow(dish_depth, 2)) / (8 * dish_depth);
	rad = (pow(top_total_key_height, 2) + 4 * pow(dish_depth, 2)) / (8 * dish_depth);

	if (inverted_dish == 1){
		translate([dish_skew_x, top_skew + dish_skew_y, total_depth - depth_difference])
		rotate([90,top_tilt,90])
		translate([0,-chord_length,0])
		cylinder(h=total_key_width + 20,r=rad, $fn=1024, center=true); // +20 just cuz
	}
	else{
		translate([dish_skew_x, top_skew + dish_skew_y, total_depth - depth_difference])
		rotate([90,top_tilt,90])
		translate([0,chord_length,0])
		cylinder(h=total_key_width + 20,r=rad, $fn=1024, center=true);
	}
}



//actual full key with space carved out and keystem/stabilizer connectors
module key(){
	union(){
		difference(){
			shape(0, 0);
			shape(wall_thickness, keytop_thickness);
		}
	}

    connector(has_brim);
    
	if (stabilizers == 1){
		stabilizer_connectors(has_brim);
	}
}

module letter(content, rot, tX, tY, tH, super) {
    rotate ([0,0,rot]) {
        translate ([tX,tY,tH]) {
            linear_extrude(height = 2) {
                text(content, "Liberation Sans", size = 7,                 direction = "ltr", spacing = 1);
            }
        }
        
    }
}

// ACTUAL OUTPUT
difference(){
	key();
    // Use with profile 1: S-, T-, etc.
    letter("T", 0, -3.3, -3, 7);
    
    // Profile 2: A-, -E, -T, -S
    //letter("9", 90, 0, -3, 5.8);
    // Profile 2: O-, -U, -D, -Z
    //letter("Z", 270, -6, -3, 5.8);
    
    // Profile 3: Vowels
    //letter("A", 180, -2.7, -8.5, 7, "5");
	// preview cube, for seeing inside the keycap
	//cube([100,100,100]);
}
